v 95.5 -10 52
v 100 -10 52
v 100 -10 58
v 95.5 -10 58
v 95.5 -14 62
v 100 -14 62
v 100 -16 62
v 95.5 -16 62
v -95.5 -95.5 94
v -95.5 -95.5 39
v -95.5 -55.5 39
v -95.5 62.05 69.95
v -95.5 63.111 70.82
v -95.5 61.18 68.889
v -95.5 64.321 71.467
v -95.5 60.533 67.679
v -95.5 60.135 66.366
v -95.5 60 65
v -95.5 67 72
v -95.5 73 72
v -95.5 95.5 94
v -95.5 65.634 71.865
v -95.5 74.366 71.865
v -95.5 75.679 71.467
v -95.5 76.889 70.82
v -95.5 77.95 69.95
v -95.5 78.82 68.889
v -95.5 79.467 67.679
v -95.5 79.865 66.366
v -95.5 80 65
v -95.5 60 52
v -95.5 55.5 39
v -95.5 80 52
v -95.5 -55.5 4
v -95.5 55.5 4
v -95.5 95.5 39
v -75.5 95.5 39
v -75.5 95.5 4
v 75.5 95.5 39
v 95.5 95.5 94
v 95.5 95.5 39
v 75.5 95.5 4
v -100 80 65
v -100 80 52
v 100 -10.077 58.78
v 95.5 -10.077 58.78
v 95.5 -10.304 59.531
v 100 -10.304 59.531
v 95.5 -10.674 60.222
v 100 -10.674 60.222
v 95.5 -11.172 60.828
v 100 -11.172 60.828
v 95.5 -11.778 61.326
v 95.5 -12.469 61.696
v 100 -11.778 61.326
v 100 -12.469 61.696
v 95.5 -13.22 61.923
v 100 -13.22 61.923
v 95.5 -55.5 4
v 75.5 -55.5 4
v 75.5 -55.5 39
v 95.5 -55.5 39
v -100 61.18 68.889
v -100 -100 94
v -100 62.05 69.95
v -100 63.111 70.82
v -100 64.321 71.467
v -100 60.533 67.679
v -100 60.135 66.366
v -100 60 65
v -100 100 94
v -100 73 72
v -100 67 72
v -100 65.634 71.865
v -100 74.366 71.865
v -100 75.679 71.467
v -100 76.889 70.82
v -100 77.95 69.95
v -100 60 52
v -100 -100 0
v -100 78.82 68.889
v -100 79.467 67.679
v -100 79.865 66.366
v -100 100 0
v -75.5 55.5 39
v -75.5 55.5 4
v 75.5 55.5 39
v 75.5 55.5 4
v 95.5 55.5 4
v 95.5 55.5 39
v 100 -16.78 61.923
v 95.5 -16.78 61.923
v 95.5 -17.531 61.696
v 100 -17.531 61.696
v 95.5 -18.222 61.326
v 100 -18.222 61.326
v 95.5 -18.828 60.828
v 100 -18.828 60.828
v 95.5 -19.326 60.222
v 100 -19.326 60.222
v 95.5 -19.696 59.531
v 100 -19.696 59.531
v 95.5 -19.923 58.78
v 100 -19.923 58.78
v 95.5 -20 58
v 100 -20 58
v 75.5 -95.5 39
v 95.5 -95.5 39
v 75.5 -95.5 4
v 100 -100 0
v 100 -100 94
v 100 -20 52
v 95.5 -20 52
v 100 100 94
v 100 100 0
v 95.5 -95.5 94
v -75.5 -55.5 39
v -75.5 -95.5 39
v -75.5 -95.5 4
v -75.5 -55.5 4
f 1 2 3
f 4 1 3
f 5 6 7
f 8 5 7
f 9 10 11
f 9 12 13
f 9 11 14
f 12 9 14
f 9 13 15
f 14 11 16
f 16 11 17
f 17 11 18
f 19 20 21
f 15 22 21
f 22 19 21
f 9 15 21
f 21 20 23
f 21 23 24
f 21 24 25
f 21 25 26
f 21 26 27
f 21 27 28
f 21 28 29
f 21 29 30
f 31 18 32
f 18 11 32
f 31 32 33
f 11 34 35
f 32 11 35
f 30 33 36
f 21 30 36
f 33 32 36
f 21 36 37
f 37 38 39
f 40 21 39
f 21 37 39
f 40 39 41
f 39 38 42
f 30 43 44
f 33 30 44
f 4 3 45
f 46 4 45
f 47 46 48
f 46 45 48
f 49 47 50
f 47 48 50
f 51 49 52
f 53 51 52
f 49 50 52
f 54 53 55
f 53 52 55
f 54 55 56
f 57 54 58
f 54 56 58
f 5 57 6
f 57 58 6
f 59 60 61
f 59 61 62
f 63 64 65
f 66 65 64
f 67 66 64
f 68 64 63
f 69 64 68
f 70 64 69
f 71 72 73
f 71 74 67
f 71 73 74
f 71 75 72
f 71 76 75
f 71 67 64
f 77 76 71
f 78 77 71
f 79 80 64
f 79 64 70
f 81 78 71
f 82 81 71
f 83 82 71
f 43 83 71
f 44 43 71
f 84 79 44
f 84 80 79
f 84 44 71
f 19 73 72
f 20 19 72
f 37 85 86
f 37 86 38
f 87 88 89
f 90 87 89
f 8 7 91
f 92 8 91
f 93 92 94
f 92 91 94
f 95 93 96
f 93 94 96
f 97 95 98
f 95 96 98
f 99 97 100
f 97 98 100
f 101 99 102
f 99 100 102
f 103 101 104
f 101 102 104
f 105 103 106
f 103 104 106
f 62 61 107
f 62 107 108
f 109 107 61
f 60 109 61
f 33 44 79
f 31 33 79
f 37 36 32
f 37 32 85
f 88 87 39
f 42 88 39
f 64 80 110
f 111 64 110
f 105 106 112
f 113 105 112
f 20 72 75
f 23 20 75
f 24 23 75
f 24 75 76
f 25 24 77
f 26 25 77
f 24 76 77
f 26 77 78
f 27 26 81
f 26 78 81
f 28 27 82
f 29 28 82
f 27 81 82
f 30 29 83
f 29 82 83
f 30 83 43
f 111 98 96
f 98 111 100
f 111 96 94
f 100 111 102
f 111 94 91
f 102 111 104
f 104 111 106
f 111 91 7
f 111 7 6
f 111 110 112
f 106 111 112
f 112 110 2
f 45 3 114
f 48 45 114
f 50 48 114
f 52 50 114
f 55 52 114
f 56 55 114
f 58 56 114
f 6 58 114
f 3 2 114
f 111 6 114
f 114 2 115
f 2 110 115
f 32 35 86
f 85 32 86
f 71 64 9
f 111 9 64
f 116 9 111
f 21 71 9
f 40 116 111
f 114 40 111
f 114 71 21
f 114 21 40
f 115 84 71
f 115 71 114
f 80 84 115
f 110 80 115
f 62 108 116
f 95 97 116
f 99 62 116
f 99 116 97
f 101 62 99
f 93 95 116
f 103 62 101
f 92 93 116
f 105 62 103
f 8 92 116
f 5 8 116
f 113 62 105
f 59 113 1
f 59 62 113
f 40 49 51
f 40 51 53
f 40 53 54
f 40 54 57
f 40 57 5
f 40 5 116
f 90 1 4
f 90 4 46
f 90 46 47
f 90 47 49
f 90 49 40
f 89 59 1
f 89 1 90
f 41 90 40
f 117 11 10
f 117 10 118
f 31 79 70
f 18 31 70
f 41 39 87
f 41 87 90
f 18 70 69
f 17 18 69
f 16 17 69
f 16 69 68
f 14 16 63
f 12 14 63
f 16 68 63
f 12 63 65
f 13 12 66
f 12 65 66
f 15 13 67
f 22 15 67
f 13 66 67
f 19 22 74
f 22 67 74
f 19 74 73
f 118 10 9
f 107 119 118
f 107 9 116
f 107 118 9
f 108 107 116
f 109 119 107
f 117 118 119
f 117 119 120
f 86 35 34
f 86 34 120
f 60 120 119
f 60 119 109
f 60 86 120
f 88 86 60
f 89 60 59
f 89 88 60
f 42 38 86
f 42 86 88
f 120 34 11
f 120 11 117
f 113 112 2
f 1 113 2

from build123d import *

# Parameters (mm, degrees)
F1_W      = 200
F1_H      = 200
F1_W_2    = 191
F1_H_2    = 191
F2_DEPTH  = 94
F0_W      = 191
F0_H      = 191
F3_DEPTH  = 4
F6_W      = 20
F6_H      = 40
F9_DEPTH  = 35
F5_W      = 20
F5_H      = 40
F10_DEPTH = 35
F8_W      = 20
F8_H      = 40
F11_DEPTH = 35
F7_W      = 20
F7_H      = 40
F12_DEPTH = 35
F14_DEPTH = 25
F16_DEPTH = 25


with BuildPart() as f2:
    # F1 (on face) → F2 (new body)
    with BuildSketch(Plane.XY):
        Rectangle(F1_W, F1_H)
        Rectangle(F1_W_2, F1_H_2, mode=Mode.SUBTRACT)
    extrude(amount=F2_DEPTH)

    # F0 (on Top) → F3 (join)
    with BuildSketch(Plane.XY):
        Rectangle(F0_W, F0_H)
    extrude(amount=F3_DEPTH)

    # F6 (on offset) → F9 (join)
    with BuildSketch(Plane.XY.offset(39)):
        with Locations((-85.5, 75.5)):
            Rectangle(F6_W, F6_H)
    extrude(amount=-F9_DEPTH)

    # F5 (on offset) → F10 (join)
    with BuildSketch(Plane.XY.offset(39)):
        with Locations((-85.5, -75.5)):
            Rectangle(F5_W, F5_H)
    extrude(amount=-F10_DEPTH)

    # F8 (on offset) → F11 (join)
    with BuildSketch(Plane.XY.offset(39)):
        with Locations((85.5, -75.5)):
            Rectangle(F8_W, F8_H)
    extrude(amount=-F11_DEPTH)

    # F7 (on offset) → F12 (join)
    with BuildSketch(Plane.XY.offset(39)):
        with Locations((85.5, 75.5)):
            Rectangle(F7_W, F7_H)
    extrude(amount=-F12_DEPTH)

    # F13 (on face) → F14 (cut)
    with BuildSketch(Plane(origin=(-100, 0, 0), x_dir=(0, -1, 0), z_dir=(-1, 0, 0))):
        with BuildLine():
            Line((-67, 72), (-73, 72))
            ThreePointArc((-73, 72), (-77.949747, 69.949747), (-80, 65))
            Line((-80, 65), (-80, 52))
            Line((-80, 52), (-60, 52))
            Line((-60, 52), (-60, 65))
            ThreePointArc((-60, 65), (-62.050253, 69.949747), (-67, 72))
        make_face()
    extrude(amount=-F14_DEPTH, mode=Mode.SUBTRACT)

    # F15 (on face) → F16 (cut)
    with BuildSketch(Plane.YZ.offset(100)):
        with BuildLine():
            Line((-14, 62), (-16, 62))
            ThreePointArc((-16, 62), (-18.828427, 60.828427), (-20, 58))
            Line((-20, 58), (-20, 52))
            Line((-20, 52), (-10, 52))
            Line((-10, 52), (-10, 58))
            ThreePointArc((-10, 58), (-11.171573, 60.828427), (-14, 62))
        make_face()
    extrude(amount=-F16_DEPTH, mode=Mode.SUBTRACT)


solid = f2.part
